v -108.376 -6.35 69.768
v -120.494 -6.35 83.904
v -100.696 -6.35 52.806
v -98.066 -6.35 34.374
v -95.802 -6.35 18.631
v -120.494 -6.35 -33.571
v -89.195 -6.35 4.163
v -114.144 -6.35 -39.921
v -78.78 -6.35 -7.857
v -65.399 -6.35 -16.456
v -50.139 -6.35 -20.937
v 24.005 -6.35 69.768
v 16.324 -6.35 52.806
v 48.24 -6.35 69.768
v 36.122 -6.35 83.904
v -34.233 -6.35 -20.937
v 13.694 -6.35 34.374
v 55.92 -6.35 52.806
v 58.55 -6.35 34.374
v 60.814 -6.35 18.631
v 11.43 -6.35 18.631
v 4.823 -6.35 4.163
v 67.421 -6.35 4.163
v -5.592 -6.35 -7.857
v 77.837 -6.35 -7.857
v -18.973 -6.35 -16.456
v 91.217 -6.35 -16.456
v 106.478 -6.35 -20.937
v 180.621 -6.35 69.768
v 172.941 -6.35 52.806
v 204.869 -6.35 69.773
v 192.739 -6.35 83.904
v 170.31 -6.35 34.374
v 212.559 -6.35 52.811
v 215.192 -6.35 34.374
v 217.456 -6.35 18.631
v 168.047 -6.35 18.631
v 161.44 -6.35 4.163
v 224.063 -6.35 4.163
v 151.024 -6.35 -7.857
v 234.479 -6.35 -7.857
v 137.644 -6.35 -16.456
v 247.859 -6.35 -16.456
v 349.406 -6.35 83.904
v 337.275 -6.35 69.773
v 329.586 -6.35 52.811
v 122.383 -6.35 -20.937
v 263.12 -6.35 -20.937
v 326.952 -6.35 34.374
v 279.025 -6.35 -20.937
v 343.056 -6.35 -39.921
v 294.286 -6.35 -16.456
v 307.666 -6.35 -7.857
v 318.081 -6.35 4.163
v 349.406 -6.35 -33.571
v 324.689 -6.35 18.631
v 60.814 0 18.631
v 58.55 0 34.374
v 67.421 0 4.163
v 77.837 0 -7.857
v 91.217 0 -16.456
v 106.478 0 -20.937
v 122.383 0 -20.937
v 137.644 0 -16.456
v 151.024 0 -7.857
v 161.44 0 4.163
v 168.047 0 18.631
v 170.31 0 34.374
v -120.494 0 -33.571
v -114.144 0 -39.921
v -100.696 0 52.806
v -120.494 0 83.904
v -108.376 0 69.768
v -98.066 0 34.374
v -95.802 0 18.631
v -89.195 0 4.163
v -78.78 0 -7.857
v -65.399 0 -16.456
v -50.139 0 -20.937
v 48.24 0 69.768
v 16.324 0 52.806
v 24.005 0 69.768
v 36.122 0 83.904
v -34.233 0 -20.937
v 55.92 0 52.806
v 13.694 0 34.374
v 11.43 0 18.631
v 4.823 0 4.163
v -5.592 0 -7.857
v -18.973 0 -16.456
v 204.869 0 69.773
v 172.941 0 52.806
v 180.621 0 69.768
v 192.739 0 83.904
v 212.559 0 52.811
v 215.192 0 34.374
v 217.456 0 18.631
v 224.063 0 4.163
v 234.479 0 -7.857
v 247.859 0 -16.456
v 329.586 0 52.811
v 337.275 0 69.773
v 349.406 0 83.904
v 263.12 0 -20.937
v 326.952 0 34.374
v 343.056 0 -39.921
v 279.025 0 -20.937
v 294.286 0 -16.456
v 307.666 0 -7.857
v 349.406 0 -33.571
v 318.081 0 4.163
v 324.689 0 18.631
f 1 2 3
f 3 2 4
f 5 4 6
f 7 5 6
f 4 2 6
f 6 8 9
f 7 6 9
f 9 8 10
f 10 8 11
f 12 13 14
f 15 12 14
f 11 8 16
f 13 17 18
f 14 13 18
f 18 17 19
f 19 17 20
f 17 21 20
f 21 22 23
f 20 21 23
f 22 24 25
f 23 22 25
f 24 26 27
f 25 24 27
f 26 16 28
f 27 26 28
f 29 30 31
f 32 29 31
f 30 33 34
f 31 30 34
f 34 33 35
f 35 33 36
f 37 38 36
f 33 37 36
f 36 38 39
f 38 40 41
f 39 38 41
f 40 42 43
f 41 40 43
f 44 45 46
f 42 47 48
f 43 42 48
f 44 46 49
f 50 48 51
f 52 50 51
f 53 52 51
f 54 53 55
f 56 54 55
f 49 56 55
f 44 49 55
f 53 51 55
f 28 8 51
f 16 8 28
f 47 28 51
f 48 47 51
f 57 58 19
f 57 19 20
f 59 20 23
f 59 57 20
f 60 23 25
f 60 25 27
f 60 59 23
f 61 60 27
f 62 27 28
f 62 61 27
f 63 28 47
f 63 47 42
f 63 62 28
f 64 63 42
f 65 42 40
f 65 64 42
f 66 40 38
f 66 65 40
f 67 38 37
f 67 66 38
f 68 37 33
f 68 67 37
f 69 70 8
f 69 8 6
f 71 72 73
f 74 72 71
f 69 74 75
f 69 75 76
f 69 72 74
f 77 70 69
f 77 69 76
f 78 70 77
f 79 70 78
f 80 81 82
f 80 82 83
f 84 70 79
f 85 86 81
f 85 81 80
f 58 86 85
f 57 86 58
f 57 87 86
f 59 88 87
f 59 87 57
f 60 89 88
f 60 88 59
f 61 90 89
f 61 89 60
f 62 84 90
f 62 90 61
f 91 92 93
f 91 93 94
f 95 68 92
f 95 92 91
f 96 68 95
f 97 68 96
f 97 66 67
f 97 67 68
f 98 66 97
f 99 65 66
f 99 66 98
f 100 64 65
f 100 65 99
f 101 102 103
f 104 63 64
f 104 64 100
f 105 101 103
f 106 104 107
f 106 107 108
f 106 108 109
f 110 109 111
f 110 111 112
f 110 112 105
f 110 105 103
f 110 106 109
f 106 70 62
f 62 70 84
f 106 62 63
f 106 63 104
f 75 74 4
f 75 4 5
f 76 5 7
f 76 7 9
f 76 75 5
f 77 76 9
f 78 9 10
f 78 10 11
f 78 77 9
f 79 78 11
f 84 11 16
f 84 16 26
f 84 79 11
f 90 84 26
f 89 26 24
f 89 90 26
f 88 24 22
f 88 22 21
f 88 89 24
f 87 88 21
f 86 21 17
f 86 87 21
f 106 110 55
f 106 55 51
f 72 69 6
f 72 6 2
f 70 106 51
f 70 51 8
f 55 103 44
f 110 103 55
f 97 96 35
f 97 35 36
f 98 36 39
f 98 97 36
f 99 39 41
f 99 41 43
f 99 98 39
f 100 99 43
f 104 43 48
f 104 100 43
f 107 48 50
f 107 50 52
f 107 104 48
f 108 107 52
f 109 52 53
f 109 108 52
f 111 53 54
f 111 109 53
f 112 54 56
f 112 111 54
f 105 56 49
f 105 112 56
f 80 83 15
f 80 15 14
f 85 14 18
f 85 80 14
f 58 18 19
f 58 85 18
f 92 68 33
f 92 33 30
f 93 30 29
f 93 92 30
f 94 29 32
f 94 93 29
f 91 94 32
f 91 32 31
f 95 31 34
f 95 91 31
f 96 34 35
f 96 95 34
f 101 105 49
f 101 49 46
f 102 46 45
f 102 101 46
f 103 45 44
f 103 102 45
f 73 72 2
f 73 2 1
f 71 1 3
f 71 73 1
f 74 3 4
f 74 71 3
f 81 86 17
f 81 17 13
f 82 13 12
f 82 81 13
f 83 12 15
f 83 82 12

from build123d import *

# Parameters (mm, degrees)
BOSS_EXTRUDE1_DEPTH = 6.35


with BuildPart() as part:
    # Sketch1 → Boss-Extrude1 (new body)
    with BuildSketch(Plane(origin=(0, 0, 0), x_dir=(1, 0, 0), z_dir=(0, 1, 0))):
        with BuildLine():
            ThreePointArc((13.694028754, -34.373994235), (19.562343483, -61.559675463), (36.122228754, -83.903994235))
            Line((36.122228754, -83.903994235), (36.122228754, 39.921005765))
            Line((36.122228754, 39.921005765), (-114.144171246, 39.921005765))
            Line((-114.144171246, 39.921005765), (-120.494171246, 33.571005765))
            Line((-120.494171246, 33.571005765), (-120.494171246, -83.903994235))
            ThreePointArc((-120.494171246, -83.903994235), (-103.934285976, -61.559675463), (-98.065971246, -34.373994235))
            ThreePointArc((-98.065971246, -34.373994235), (-42.185971246, 21.506005765), (13.694028754, -34.373994235))
        make_face()
        with BuildLine():
            Line((36.122228754, 39.921005765), (36.122228754, -83.903994235))
            ThreePointArc((36.122228754, -83.903994235), (52.682114024, -61.559675463), (58.550428754, -34.373994235))
            ThreePointArc((58.550428754, -34.373994235), (114.430428754, 21.506005765), (170.310428754, -34.373994235))
            ThreePointArc((170.310428754, -34.373994235), (176.178743483, -61.559675463), (192.738628754, -83.903994235))
            Line((192.738628754, -83.903994235), (192.738628754, 39.921005765))
            Line((192.738628754, 39.921005765), (36.122228754, 39.921005765))
        make_face()
        with BuildLine():
            Line((343.055828754, 39.921005765), (192.738628754, 39.921005765))
            Line((192.738628754, 39.921005765), (192.738628754, -83.903994235))
            ThreePointArc((192.738628754, -83.903994235), (209.316728258, -61.564916677), (215.192228754, -34.373994235))
            ThreePointArc((215.192228754, -34.373994235), (271.072228754, 21.506005765), (326.952228754, -34.373994235))
            ThreePointArc((326.952228754, -34.373994235), (332.827729249, -61.564916677), (349.405828754, -83.903994235))
            Line((349.405828754, -83.903994235), (349.405828754, 33.571005765))
            Line((349.405828754, 33.571005765), (343.055828754, 39.921005765))
        make_face()
    extrude(amount=-BOSS_EXTRUDE1_DEPTH)


solid = part.part
